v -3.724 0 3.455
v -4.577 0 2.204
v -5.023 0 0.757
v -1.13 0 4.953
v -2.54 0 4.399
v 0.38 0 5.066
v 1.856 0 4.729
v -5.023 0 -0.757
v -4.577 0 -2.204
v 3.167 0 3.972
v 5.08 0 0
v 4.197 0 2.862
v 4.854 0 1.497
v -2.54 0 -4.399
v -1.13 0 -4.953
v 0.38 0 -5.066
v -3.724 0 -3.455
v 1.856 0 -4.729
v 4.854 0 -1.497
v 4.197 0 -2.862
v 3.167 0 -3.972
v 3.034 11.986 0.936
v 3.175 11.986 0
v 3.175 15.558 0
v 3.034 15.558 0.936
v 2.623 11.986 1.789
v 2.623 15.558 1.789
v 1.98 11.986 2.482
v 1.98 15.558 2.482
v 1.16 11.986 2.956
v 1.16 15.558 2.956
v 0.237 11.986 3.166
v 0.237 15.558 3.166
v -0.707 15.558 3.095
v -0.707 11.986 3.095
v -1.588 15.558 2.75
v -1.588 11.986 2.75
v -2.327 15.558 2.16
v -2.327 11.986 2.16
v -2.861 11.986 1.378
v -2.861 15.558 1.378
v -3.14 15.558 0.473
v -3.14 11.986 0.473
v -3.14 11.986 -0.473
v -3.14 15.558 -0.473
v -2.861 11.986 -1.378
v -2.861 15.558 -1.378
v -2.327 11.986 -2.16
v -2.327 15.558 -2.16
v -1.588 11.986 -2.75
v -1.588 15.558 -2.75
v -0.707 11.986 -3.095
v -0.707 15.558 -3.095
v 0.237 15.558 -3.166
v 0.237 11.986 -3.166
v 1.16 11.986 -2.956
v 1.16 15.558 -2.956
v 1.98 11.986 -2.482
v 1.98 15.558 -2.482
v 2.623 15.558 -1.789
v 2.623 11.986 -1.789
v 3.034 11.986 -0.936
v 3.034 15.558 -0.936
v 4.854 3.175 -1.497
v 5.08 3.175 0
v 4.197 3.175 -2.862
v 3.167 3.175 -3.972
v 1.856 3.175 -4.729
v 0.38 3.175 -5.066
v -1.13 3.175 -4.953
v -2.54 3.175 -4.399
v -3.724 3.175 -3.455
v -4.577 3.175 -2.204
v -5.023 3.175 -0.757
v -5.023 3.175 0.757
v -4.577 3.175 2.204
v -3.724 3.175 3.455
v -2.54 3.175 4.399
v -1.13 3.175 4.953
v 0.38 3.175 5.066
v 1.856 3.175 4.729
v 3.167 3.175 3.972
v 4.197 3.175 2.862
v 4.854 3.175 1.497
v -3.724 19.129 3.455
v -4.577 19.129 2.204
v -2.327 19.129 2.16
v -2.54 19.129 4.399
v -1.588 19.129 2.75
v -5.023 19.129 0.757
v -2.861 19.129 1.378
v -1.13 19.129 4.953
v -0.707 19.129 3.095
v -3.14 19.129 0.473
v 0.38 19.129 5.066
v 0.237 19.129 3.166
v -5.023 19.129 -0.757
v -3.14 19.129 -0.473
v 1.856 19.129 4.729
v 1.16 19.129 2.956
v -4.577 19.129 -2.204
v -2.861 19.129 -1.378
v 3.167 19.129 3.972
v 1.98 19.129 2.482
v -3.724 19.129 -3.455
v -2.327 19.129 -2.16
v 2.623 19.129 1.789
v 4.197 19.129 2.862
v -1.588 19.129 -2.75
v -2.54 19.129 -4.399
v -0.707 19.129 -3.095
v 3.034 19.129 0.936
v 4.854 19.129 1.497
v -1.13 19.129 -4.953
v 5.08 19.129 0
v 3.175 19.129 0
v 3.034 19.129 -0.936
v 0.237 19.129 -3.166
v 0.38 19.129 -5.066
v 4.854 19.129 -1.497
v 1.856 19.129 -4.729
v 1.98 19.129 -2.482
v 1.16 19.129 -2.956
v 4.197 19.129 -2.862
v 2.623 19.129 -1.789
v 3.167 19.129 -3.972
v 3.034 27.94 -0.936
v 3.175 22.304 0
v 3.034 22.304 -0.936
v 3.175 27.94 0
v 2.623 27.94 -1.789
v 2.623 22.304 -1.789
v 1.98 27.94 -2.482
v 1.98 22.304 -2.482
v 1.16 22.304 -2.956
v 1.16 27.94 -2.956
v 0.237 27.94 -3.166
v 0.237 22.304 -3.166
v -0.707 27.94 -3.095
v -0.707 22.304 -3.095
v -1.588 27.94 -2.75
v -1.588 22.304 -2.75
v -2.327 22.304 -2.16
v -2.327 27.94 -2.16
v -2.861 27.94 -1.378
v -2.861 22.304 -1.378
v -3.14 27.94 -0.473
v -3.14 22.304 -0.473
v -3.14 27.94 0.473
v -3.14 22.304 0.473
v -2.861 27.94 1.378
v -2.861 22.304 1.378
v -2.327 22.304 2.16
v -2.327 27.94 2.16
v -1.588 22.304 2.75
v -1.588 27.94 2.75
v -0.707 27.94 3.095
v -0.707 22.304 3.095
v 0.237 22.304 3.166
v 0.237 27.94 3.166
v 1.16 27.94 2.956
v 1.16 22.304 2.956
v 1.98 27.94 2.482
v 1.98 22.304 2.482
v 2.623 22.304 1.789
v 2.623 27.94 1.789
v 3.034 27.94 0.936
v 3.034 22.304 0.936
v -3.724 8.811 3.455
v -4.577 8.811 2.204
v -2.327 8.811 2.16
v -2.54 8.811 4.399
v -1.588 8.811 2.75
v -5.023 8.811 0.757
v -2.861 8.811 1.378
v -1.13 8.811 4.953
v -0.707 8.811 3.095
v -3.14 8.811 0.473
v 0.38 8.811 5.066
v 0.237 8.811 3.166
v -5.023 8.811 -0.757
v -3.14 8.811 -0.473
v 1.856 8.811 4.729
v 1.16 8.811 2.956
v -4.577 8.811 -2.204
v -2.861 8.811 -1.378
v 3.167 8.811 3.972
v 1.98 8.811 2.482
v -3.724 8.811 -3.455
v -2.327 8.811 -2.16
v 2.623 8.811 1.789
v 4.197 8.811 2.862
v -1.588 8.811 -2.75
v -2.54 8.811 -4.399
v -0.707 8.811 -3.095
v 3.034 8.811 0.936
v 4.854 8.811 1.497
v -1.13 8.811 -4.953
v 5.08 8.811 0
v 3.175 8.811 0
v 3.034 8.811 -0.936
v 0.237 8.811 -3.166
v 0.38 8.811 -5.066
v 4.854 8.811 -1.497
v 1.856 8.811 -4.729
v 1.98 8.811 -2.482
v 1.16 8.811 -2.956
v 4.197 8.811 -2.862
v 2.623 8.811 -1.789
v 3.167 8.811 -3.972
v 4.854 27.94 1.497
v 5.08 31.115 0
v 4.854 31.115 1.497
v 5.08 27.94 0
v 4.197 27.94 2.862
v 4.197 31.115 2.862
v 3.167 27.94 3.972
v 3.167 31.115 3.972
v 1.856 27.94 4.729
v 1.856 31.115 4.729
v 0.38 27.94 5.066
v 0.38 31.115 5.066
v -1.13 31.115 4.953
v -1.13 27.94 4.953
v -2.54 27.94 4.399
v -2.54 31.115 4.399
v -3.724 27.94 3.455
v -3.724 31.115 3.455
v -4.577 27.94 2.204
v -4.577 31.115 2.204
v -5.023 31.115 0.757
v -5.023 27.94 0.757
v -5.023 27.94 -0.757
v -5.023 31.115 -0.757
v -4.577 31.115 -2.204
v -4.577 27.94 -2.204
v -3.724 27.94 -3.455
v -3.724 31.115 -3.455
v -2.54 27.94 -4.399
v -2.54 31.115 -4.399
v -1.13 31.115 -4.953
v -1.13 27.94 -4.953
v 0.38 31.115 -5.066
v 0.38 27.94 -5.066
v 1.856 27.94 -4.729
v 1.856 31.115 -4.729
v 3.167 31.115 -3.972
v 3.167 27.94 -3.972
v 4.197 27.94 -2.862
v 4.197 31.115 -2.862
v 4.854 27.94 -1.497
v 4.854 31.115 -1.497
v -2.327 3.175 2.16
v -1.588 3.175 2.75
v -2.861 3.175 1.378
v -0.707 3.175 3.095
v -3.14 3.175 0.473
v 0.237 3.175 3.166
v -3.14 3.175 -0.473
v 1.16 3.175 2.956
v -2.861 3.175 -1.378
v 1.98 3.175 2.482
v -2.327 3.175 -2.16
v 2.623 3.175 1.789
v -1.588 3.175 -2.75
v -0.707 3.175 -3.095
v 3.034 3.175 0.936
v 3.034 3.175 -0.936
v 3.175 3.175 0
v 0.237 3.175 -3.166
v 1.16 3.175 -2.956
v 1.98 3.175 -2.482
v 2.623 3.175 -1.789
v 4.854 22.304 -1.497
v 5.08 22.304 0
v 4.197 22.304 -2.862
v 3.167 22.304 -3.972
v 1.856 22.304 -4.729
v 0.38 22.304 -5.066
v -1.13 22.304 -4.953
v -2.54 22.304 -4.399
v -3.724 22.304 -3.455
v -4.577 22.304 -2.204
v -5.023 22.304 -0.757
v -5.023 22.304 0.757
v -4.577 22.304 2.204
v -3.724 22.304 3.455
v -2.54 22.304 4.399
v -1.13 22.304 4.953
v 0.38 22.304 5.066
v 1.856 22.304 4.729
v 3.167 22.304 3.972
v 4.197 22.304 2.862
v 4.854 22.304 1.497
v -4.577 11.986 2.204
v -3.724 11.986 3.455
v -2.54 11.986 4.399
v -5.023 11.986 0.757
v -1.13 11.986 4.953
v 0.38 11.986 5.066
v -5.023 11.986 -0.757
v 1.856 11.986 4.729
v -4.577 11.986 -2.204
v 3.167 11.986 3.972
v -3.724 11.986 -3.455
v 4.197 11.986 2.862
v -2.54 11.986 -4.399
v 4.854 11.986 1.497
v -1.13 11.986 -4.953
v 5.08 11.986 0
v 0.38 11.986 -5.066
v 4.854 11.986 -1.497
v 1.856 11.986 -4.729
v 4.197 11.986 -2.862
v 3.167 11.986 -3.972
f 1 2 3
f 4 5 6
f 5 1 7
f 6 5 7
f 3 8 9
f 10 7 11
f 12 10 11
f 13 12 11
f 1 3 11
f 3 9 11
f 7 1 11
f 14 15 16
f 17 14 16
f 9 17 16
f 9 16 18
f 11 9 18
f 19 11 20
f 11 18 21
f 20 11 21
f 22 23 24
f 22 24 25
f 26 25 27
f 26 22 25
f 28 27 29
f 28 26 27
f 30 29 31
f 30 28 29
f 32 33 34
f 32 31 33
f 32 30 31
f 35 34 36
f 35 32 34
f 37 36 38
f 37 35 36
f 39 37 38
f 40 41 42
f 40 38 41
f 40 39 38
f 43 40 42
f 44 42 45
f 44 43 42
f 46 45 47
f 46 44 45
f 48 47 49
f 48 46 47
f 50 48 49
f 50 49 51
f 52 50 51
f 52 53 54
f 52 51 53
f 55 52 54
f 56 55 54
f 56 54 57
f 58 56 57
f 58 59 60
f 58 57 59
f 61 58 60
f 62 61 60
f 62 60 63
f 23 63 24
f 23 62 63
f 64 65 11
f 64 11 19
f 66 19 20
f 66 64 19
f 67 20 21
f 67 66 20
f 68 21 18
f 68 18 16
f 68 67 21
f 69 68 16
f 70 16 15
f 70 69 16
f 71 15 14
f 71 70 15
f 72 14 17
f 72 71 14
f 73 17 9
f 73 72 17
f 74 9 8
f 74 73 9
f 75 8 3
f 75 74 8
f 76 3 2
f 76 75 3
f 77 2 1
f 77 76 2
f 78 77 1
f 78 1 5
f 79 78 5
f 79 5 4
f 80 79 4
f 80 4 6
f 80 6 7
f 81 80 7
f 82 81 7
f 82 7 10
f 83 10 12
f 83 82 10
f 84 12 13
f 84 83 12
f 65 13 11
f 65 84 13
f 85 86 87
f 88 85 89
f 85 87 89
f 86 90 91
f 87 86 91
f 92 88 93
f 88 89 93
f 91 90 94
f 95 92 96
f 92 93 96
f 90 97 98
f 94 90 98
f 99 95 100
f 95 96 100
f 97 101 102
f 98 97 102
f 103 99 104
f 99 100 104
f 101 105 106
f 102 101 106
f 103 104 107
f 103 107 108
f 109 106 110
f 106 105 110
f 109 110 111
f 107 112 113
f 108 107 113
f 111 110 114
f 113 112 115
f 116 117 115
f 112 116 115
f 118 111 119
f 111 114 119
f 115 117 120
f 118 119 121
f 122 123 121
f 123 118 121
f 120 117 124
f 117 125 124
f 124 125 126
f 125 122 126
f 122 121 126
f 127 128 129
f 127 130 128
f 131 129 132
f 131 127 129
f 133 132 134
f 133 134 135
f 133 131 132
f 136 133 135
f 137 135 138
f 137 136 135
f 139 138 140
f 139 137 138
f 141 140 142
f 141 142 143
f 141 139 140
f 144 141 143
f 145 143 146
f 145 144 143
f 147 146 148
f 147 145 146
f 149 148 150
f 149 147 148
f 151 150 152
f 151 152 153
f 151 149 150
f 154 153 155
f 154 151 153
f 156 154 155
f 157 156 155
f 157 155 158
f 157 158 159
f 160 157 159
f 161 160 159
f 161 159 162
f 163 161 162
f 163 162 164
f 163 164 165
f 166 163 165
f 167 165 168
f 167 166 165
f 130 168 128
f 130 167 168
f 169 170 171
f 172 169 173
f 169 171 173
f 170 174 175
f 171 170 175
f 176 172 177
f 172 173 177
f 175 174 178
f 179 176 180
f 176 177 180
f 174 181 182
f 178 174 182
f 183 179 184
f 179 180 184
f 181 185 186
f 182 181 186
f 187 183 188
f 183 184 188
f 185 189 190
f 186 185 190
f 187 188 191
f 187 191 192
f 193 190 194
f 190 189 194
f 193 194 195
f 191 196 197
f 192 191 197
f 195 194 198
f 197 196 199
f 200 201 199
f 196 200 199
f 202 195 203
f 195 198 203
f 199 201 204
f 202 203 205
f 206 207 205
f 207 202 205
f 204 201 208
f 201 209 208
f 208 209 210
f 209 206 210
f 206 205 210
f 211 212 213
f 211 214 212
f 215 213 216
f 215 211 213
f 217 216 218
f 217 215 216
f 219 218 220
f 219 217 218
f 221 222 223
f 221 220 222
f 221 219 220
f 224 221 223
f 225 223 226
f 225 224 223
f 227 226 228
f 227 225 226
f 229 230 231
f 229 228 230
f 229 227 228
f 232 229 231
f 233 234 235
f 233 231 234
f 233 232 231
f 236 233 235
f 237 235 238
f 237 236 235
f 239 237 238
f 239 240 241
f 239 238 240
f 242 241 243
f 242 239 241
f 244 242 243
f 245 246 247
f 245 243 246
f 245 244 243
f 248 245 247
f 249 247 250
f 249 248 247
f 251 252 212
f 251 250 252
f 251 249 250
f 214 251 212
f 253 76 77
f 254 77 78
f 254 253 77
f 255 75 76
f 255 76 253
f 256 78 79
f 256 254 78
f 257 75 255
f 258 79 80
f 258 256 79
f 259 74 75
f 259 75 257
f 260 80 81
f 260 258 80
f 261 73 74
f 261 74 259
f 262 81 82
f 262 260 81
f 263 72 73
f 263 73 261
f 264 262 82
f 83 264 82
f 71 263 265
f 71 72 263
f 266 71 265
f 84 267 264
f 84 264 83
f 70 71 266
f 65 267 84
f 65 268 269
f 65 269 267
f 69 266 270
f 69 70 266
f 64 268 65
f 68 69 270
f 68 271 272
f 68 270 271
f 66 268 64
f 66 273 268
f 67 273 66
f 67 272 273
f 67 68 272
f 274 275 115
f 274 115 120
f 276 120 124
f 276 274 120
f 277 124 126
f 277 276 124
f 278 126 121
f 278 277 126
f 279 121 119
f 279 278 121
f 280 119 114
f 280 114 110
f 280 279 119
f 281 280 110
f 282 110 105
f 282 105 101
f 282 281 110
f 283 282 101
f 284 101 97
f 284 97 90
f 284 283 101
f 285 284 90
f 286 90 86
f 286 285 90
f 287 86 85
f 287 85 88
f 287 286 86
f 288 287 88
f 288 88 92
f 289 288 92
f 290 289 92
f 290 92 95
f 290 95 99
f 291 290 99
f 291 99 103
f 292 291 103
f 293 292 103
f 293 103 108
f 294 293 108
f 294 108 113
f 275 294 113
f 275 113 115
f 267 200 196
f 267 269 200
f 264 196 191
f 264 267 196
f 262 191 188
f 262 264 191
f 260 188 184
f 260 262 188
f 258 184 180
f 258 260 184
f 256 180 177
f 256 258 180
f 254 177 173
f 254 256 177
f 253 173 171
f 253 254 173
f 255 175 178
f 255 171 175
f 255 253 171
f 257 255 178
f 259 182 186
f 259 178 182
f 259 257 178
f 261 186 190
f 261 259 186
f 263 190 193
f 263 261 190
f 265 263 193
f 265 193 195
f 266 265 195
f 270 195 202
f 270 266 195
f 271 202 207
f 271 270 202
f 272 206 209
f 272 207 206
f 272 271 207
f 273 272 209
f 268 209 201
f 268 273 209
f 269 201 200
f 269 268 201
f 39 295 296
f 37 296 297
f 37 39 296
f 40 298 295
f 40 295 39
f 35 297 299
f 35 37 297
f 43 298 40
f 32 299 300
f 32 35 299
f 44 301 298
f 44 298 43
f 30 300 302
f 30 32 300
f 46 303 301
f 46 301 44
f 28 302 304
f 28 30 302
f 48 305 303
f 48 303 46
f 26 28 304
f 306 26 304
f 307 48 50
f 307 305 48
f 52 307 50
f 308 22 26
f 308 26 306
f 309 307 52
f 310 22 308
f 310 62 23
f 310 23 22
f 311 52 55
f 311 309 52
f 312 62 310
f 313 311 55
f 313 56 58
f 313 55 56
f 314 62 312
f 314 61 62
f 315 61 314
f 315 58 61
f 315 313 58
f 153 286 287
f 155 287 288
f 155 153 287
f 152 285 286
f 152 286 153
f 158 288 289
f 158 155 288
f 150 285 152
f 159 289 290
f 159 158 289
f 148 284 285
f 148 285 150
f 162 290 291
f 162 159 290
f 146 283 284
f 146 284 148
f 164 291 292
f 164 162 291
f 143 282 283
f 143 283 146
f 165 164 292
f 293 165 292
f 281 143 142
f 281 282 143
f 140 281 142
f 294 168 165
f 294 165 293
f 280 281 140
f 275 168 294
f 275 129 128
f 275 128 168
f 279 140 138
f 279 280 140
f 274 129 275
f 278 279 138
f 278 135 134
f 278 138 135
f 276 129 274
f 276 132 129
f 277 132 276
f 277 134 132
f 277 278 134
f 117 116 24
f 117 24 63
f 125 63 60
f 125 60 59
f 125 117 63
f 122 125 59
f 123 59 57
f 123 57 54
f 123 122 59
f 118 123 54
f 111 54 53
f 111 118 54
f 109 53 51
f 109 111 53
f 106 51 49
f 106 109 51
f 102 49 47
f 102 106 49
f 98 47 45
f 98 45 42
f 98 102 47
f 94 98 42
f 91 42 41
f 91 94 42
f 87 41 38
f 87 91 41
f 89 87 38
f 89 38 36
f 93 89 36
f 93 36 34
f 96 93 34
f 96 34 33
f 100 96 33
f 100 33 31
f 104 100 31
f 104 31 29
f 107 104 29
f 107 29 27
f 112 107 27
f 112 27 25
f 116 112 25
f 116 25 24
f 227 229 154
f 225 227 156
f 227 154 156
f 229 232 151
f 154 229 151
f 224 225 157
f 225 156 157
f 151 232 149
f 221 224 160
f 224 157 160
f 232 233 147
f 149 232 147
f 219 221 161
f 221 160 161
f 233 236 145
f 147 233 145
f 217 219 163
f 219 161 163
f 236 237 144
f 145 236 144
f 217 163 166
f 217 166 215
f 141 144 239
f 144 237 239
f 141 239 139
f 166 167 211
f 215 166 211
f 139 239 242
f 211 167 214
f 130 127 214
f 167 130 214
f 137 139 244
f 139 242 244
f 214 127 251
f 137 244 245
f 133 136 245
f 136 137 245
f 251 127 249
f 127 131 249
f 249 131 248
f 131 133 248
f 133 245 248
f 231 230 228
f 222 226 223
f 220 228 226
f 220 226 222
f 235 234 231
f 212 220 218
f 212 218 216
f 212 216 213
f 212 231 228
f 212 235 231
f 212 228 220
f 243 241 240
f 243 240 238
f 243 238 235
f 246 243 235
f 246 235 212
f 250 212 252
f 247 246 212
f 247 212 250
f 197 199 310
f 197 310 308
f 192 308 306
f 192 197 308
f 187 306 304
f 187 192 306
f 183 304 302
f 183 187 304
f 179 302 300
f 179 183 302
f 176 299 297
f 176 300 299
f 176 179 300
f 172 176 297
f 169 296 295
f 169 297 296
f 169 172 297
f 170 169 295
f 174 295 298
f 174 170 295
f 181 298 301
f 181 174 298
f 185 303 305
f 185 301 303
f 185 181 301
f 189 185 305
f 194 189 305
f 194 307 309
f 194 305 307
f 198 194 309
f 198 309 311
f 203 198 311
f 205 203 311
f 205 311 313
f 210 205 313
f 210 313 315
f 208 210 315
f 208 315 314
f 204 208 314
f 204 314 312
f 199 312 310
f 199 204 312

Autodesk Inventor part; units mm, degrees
ref_plane "YZ Plane" through (0, 0, 0) normal (1, 0, 0) x (0, 1, 0)
ref_plane "XZ Plane" through (0, 0, 0) normal (0, 1, 0) x (-1, 0, 0)
ref_plane "XY Plane" through (0, 0, 0) normal (0, 0, 1) x (1, 0, 0)
sketch "Sketch1" plane through (0, 0, 0) normal (0, 0, 1) x (1, 0, 0)
  line L0 (0, 0) -> (0, 31.115)
  line L1 (0, 31.115) -> (5.08, 31.115)
  line L2 (5.08, 31.115) -> (5.08, 27.94)
  line L3 (5.08, 27.94) -> (3.175, 27.94)
  line L4 (3.175, 15.5575) -> (3.175, 19.1294)
  line L5 (3.175, 19.1294) -> (5.08, 19.1294)
  line L6 (5.08, 19.1294) -> (5.08, 22.3044)
  line L7 (5.08, 22.3044) -> (3.175, 22.3044)
  line L8 (3.175, 15.5575) -> (3.175, 19.1294)
  line L9 (3.175, 22.3044) -> (3.175, 27.94)
  line L10 (0, 0) -> (5.08, 0)
  line L11 (5.08, 0) -> (5.08, 3.175)
  line L12 (5.08, 3.175) -> (3.175, 3.175)
  line L13 (3.175, 15.5575) -> (3.175, 11.9856)
  line L14 (3.175, 11.9856) -> (5.08, 11.9856)
  line L15 (5.08, 11.9856) -> (5.08, 8.8106)
  line L16 (5.08, 8.8106) -> (3.175, 8.8106)
  line L17 (3.175, 15.5575) -> (3.175, 11.9856)
  line L18 (3.175, 8.8106) -> (3.175, 3.175)
  dimension "d0" = 31.115
  dimension "d1" = 5.08
  dimension "d2" = 3.175
  dimension "d5" = 3.175
revolve "Revolution1" add sketch "Sketch1" angle 360 about axis through (0, 0, 0) along (0, 1, 0)
properties part number "Wrist Pin"
